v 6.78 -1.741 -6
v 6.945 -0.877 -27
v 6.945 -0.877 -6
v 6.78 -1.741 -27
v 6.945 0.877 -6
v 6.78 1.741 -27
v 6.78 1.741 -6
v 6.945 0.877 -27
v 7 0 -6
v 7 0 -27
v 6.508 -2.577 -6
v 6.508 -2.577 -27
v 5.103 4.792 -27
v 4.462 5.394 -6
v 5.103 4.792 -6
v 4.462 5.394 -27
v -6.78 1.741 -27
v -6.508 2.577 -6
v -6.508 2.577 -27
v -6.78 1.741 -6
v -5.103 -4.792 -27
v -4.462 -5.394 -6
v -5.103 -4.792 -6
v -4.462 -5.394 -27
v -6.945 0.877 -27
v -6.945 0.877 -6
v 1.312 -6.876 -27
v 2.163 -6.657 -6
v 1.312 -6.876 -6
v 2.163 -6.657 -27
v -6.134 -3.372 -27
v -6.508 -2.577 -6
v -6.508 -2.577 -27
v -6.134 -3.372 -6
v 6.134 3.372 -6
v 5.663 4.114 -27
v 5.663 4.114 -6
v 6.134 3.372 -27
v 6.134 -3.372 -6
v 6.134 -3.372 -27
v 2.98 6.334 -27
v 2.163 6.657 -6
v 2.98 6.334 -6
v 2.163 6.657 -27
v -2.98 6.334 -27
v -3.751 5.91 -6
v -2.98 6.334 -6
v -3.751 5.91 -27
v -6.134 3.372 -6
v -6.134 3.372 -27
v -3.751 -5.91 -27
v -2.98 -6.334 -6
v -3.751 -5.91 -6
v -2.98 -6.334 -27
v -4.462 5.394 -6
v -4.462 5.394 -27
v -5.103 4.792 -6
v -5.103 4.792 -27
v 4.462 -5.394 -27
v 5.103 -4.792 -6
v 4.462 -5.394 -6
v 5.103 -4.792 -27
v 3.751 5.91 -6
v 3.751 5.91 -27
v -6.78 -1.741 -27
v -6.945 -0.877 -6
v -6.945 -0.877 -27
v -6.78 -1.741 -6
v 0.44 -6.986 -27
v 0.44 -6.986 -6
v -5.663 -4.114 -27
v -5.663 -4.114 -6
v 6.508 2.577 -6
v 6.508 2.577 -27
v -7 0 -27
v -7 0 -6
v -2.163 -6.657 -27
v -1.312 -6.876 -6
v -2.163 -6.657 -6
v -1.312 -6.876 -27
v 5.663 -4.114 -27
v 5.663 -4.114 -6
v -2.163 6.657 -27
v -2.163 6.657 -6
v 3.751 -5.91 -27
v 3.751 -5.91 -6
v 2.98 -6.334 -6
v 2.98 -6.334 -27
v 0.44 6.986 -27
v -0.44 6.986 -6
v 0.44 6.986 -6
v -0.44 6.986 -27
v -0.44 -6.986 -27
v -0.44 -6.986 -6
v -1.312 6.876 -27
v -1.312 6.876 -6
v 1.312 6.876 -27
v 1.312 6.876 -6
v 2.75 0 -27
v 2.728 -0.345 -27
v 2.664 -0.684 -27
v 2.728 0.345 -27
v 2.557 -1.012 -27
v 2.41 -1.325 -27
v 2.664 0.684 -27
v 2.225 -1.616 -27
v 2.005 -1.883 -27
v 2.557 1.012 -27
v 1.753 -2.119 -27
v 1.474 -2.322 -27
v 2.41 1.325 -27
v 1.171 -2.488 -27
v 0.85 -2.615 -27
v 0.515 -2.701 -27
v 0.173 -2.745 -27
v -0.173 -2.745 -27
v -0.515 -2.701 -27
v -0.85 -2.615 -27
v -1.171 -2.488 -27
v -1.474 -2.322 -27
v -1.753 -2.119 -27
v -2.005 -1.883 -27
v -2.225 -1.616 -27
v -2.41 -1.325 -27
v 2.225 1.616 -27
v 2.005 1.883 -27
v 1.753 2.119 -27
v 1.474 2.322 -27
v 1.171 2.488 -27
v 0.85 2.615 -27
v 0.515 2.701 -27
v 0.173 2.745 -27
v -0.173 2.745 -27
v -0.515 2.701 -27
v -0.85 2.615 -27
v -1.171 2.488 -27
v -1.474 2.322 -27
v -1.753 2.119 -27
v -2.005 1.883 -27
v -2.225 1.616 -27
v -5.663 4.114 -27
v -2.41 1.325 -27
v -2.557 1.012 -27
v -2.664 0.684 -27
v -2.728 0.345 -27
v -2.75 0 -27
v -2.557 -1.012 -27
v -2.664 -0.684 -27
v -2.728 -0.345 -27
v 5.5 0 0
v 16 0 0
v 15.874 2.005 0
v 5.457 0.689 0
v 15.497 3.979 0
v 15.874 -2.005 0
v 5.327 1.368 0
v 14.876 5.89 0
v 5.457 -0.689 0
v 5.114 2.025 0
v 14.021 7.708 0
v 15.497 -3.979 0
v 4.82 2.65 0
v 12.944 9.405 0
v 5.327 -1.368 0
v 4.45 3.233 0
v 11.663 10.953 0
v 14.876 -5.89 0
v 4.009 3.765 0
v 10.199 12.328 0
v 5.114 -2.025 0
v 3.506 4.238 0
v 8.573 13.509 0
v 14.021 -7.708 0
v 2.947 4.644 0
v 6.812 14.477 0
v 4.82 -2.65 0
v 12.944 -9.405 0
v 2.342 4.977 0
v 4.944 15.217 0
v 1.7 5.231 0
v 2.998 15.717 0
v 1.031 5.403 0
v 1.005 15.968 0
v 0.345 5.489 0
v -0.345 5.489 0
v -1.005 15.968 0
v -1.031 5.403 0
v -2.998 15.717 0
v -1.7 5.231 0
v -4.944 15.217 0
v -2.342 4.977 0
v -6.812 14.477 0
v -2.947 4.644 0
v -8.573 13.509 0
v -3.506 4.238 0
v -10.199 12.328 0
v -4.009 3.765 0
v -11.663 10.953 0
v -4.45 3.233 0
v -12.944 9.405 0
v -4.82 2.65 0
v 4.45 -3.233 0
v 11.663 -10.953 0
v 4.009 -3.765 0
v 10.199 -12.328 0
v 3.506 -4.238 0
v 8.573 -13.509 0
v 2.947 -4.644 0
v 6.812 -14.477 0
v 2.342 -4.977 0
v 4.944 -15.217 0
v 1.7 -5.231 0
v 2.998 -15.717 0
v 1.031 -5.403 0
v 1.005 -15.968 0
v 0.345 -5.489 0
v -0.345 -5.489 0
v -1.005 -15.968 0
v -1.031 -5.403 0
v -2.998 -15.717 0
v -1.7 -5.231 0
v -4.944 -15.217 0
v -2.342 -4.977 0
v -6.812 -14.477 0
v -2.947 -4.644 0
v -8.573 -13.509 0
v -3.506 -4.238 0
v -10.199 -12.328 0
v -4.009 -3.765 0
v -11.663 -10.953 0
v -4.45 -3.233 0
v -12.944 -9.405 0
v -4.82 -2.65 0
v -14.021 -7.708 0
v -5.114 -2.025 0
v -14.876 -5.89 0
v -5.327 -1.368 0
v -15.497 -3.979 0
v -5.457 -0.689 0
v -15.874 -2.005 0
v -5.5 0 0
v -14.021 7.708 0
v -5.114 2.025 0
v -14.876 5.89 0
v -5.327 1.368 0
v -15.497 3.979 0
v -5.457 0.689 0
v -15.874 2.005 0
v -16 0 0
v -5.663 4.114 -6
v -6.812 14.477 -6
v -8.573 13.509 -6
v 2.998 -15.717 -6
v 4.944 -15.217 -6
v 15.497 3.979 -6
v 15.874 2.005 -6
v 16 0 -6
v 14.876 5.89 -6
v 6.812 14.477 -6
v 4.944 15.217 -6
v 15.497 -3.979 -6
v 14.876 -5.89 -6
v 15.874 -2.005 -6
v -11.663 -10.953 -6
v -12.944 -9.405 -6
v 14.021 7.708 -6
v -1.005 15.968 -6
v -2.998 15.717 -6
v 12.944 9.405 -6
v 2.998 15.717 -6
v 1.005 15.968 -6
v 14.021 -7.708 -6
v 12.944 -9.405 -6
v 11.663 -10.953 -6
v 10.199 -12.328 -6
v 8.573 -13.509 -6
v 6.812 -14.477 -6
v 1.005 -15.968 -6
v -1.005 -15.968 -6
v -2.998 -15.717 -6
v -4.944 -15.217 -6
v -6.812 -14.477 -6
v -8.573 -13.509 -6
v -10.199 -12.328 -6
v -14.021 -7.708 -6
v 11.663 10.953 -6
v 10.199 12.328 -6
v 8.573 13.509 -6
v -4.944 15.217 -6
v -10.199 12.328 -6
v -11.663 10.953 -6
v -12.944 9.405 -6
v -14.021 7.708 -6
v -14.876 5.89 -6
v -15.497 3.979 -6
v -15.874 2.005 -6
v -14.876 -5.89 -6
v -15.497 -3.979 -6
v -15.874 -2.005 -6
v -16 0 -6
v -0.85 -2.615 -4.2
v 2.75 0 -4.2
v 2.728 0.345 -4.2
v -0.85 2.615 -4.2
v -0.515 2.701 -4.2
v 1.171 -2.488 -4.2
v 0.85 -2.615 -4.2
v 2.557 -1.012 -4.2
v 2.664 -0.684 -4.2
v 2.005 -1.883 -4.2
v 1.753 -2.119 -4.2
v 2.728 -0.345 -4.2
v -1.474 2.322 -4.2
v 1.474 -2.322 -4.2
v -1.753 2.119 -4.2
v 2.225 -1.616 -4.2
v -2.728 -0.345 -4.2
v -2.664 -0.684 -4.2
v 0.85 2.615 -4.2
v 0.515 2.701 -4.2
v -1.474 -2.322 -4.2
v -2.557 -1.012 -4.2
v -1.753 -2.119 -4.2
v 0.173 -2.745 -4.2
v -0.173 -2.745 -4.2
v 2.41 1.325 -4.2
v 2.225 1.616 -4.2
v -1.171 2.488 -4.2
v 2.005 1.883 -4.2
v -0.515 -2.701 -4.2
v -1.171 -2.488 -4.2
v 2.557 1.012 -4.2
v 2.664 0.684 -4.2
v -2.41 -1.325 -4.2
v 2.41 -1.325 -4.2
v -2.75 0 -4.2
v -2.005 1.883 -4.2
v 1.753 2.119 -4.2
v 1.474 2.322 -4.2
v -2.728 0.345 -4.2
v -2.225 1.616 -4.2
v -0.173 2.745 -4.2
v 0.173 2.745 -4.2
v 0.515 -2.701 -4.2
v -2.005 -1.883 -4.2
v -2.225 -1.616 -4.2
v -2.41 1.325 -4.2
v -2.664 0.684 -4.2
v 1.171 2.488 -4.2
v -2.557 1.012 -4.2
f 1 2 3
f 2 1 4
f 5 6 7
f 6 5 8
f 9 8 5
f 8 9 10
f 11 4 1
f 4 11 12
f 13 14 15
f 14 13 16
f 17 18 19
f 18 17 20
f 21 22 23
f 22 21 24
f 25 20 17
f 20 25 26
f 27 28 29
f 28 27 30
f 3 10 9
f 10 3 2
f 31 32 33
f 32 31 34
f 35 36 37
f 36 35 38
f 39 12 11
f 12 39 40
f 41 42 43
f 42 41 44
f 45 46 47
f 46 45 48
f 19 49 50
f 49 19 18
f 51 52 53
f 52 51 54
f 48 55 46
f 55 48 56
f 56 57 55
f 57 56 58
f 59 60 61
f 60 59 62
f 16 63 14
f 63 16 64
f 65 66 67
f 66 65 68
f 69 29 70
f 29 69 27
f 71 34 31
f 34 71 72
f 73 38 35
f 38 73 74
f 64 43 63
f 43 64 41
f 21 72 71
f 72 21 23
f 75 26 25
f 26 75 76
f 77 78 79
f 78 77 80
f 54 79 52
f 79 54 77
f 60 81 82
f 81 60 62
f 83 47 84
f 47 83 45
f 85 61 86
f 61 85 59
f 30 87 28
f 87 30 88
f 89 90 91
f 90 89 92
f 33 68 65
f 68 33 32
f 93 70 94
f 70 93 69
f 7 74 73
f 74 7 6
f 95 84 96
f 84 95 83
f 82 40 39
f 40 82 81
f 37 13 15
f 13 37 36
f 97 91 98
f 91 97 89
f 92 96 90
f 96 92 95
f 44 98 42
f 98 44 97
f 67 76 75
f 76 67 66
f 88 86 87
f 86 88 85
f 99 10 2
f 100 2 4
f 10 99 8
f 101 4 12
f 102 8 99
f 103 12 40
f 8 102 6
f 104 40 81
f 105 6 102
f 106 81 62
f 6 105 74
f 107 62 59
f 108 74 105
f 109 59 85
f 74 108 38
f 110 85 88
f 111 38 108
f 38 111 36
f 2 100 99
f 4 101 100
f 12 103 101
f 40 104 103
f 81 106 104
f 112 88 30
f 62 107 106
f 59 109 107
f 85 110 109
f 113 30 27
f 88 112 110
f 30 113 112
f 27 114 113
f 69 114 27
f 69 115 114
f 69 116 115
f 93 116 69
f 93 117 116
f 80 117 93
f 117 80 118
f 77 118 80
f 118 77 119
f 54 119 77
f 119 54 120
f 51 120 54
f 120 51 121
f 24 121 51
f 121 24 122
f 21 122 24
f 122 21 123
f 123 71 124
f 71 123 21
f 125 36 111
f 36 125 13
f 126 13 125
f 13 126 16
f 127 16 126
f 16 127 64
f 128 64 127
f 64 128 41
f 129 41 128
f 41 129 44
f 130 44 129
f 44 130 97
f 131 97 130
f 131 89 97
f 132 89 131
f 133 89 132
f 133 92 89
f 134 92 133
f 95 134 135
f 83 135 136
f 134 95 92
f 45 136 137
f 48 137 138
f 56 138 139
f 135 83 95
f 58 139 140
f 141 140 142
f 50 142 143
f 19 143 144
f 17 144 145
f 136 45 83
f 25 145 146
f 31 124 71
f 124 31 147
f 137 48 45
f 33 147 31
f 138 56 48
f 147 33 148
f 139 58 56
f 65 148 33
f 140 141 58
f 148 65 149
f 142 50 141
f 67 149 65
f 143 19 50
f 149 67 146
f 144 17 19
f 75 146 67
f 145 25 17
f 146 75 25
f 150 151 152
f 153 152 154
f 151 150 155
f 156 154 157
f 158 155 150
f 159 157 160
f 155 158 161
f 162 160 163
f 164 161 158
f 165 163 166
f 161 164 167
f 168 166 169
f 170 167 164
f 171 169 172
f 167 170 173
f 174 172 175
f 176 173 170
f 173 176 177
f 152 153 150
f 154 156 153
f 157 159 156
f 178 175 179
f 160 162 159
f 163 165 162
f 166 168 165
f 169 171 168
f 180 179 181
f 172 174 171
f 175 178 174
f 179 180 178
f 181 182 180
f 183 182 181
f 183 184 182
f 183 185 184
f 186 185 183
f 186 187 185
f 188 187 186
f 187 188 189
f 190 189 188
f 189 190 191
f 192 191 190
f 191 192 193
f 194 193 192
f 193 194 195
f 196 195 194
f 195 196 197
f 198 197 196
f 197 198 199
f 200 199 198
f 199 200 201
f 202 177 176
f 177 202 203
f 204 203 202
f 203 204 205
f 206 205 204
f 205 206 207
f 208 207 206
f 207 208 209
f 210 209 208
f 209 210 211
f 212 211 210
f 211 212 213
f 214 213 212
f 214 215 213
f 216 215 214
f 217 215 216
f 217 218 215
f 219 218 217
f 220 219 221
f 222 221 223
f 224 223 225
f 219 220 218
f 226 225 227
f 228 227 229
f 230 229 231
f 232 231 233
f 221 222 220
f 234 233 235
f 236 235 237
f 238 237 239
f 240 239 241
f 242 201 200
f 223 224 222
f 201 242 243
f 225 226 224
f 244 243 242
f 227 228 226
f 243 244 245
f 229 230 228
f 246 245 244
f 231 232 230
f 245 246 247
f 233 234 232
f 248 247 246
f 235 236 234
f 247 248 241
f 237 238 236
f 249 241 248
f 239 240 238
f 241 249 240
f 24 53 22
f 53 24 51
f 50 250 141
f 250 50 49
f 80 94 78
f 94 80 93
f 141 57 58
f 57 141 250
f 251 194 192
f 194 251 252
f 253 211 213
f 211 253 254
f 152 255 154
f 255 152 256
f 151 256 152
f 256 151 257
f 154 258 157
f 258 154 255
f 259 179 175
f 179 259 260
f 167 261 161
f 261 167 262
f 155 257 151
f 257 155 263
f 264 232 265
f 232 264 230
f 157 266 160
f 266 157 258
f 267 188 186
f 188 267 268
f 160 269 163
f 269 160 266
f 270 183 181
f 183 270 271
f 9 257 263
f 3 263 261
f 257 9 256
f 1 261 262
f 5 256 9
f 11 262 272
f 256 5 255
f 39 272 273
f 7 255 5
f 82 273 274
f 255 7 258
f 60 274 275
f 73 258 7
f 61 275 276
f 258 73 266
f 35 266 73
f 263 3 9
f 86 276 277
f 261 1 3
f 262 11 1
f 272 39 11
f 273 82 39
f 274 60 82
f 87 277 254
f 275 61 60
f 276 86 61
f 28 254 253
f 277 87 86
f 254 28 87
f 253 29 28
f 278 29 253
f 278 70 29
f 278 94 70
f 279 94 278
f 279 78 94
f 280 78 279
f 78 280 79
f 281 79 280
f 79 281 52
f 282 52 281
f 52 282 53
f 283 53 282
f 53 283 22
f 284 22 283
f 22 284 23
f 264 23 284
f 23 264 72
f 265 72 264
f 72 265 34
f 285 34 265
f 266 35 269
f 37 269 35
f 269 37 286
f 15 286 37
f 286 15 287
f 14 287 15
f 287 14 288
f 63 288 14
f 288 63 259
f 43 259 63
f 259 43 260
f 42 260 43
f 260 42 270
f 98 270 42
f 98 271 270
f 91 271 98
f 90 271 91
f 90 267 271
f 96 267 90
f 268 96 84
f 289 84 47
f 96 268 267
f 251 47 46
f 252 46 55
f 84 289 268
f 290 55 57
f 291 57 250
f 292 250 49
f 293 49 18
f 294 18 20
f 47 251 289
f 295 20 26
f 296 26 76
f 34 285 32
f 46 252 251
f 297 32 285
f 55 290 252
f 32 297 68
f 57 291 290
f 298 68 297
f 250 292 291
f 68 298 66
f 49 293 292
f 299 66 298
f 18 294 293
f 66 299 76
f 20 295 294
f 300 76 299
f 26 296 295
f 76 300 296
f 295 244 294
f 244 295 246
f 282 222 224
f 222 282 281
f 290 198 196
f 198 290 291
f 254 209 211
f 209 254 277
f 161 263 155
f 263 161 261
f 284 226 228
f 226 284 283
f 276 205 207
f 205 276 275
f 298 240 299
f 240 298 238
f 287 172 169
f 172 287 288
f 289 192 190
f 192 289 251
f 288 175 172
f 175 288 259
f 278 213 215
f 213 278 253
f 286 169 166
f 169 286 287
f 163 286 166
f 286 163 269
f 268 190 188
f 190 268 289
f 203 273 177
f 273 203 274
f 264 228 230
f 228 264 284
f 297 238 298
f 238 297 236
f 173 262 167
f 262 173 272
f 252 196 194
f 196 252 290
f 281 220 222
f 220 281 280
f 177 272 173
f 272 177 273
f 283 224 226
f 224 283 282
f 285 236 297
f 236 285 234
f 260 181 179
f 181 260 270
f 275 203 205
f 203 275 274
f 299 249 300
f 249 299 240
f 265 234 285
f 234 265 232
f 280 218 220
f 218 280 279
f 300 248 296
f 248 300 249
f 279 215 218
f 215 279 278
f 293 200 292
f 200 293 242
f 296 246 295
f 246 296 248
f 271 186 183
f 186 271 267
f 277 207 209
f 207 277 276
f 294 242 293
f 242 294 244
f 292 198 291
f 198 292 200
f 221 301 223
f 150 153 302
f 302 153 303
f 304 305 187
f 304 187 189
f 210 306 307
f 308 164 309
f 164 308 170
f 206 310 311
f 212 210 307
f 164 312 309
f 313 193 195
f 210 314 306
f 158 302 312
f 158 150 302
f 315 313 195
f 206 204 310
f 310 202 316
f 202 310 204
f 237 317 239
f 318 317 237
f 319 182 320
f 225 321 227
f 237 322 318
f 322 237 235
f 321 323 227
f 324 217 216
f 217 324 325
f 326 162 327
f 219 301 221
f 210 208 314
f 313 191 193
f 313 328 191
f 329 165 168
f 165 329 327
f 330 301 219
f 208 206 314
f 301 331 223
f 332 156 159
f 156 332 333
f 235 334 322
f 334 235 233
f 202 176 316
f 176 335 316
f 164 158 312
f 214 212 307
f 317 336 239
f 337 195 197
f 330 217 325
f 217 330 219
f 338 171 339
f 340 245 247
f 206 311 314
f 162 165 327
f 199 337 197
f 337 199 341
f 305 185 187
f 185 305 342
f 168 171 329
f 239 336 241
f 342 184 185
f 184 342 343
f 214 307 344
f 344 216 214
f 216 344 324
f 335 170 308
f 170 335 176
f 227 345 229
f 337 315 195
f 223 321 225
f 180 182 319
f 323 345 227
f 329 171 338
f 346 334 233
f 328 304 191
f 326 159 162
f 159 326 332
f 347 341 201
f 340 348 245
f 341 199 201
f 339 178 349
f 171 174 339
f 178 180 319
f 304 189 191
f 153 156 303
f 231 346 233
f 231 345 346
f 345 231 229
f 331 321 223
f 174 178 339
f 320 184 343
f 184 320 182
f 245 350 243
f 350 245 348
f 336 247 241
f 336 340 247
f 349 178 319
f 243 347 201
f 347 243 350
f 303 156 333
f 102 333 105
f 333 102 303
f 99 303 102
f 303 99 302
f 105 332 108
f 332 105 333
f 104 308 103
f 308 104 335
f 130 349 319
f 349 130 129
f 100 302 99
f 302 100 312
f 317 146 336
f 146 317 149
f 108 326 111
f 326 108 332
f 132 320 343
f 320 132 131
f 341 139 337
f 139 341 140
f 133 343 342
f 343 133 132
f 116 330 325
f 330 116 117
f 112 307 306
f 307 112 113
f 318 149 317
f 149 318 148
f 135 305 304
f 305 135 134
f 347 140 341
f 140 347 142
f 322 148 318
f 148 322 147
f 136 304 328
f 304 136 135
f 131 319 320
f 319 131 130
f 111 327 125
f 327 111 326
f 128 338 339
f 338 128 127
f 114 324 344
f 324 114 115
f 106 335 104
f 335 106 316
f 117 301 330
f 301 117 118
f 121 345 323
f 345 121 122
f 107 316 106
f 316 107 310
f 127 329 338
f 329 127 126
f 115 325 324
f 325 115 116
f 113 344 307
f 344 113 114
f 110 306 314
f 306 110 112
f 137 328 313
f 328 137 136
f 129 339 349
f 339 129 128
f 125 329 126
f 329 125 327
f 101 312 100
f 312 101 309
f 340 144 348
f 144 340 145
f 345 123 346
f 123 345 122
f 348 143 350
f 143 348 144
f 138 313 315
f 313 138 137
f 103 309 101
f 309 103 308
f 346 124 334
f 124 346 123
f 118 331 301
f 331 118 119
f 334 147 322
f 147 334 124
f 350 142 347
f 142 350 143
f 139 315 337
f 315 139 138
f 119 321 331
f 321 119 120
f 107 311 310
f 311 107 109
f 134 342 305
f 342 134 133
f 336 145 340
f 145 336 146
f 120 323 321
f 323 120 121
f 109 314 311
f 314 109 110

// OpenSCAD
$fn = 50;


difference() {
	union() {
		translate(v = [0, 0, -27.0000000000]) {
			cylinder(h = 27, r = 7.0000000000);
		}
		translate(v = [0, 0, -6.0000000000]) {
			cylinder(h = 6, r = 16.0000000000);
		}
	}
	union() {
		translate(v = [0, 0, 0]) {
			rotate(a = [0, 0, 0]) {
				difference() {
					union() {
						#translate(v = [0, 0, -27.0000000000]) {
							cylinder(h = 27, r = 2.2500000000);
						}
						#translate(v = [0, 0, -4.2000000000]) {
							cylinder(h = 4.2000000000, r = 7.0000000000, r1 = 2.7500000000, r2 = 5.5000000000);
						}
						#translate(v = [0, 0, -27.0000000000]) {
							cylinder(h = 27, r = 2.7500000000);
						}
						#translate(v = [0, 0, -27.0000000000]) {
							cylinder(h = 27, r = 2.2500000000);
						}
					}
					union();
				}
			}
		}
	}
}
